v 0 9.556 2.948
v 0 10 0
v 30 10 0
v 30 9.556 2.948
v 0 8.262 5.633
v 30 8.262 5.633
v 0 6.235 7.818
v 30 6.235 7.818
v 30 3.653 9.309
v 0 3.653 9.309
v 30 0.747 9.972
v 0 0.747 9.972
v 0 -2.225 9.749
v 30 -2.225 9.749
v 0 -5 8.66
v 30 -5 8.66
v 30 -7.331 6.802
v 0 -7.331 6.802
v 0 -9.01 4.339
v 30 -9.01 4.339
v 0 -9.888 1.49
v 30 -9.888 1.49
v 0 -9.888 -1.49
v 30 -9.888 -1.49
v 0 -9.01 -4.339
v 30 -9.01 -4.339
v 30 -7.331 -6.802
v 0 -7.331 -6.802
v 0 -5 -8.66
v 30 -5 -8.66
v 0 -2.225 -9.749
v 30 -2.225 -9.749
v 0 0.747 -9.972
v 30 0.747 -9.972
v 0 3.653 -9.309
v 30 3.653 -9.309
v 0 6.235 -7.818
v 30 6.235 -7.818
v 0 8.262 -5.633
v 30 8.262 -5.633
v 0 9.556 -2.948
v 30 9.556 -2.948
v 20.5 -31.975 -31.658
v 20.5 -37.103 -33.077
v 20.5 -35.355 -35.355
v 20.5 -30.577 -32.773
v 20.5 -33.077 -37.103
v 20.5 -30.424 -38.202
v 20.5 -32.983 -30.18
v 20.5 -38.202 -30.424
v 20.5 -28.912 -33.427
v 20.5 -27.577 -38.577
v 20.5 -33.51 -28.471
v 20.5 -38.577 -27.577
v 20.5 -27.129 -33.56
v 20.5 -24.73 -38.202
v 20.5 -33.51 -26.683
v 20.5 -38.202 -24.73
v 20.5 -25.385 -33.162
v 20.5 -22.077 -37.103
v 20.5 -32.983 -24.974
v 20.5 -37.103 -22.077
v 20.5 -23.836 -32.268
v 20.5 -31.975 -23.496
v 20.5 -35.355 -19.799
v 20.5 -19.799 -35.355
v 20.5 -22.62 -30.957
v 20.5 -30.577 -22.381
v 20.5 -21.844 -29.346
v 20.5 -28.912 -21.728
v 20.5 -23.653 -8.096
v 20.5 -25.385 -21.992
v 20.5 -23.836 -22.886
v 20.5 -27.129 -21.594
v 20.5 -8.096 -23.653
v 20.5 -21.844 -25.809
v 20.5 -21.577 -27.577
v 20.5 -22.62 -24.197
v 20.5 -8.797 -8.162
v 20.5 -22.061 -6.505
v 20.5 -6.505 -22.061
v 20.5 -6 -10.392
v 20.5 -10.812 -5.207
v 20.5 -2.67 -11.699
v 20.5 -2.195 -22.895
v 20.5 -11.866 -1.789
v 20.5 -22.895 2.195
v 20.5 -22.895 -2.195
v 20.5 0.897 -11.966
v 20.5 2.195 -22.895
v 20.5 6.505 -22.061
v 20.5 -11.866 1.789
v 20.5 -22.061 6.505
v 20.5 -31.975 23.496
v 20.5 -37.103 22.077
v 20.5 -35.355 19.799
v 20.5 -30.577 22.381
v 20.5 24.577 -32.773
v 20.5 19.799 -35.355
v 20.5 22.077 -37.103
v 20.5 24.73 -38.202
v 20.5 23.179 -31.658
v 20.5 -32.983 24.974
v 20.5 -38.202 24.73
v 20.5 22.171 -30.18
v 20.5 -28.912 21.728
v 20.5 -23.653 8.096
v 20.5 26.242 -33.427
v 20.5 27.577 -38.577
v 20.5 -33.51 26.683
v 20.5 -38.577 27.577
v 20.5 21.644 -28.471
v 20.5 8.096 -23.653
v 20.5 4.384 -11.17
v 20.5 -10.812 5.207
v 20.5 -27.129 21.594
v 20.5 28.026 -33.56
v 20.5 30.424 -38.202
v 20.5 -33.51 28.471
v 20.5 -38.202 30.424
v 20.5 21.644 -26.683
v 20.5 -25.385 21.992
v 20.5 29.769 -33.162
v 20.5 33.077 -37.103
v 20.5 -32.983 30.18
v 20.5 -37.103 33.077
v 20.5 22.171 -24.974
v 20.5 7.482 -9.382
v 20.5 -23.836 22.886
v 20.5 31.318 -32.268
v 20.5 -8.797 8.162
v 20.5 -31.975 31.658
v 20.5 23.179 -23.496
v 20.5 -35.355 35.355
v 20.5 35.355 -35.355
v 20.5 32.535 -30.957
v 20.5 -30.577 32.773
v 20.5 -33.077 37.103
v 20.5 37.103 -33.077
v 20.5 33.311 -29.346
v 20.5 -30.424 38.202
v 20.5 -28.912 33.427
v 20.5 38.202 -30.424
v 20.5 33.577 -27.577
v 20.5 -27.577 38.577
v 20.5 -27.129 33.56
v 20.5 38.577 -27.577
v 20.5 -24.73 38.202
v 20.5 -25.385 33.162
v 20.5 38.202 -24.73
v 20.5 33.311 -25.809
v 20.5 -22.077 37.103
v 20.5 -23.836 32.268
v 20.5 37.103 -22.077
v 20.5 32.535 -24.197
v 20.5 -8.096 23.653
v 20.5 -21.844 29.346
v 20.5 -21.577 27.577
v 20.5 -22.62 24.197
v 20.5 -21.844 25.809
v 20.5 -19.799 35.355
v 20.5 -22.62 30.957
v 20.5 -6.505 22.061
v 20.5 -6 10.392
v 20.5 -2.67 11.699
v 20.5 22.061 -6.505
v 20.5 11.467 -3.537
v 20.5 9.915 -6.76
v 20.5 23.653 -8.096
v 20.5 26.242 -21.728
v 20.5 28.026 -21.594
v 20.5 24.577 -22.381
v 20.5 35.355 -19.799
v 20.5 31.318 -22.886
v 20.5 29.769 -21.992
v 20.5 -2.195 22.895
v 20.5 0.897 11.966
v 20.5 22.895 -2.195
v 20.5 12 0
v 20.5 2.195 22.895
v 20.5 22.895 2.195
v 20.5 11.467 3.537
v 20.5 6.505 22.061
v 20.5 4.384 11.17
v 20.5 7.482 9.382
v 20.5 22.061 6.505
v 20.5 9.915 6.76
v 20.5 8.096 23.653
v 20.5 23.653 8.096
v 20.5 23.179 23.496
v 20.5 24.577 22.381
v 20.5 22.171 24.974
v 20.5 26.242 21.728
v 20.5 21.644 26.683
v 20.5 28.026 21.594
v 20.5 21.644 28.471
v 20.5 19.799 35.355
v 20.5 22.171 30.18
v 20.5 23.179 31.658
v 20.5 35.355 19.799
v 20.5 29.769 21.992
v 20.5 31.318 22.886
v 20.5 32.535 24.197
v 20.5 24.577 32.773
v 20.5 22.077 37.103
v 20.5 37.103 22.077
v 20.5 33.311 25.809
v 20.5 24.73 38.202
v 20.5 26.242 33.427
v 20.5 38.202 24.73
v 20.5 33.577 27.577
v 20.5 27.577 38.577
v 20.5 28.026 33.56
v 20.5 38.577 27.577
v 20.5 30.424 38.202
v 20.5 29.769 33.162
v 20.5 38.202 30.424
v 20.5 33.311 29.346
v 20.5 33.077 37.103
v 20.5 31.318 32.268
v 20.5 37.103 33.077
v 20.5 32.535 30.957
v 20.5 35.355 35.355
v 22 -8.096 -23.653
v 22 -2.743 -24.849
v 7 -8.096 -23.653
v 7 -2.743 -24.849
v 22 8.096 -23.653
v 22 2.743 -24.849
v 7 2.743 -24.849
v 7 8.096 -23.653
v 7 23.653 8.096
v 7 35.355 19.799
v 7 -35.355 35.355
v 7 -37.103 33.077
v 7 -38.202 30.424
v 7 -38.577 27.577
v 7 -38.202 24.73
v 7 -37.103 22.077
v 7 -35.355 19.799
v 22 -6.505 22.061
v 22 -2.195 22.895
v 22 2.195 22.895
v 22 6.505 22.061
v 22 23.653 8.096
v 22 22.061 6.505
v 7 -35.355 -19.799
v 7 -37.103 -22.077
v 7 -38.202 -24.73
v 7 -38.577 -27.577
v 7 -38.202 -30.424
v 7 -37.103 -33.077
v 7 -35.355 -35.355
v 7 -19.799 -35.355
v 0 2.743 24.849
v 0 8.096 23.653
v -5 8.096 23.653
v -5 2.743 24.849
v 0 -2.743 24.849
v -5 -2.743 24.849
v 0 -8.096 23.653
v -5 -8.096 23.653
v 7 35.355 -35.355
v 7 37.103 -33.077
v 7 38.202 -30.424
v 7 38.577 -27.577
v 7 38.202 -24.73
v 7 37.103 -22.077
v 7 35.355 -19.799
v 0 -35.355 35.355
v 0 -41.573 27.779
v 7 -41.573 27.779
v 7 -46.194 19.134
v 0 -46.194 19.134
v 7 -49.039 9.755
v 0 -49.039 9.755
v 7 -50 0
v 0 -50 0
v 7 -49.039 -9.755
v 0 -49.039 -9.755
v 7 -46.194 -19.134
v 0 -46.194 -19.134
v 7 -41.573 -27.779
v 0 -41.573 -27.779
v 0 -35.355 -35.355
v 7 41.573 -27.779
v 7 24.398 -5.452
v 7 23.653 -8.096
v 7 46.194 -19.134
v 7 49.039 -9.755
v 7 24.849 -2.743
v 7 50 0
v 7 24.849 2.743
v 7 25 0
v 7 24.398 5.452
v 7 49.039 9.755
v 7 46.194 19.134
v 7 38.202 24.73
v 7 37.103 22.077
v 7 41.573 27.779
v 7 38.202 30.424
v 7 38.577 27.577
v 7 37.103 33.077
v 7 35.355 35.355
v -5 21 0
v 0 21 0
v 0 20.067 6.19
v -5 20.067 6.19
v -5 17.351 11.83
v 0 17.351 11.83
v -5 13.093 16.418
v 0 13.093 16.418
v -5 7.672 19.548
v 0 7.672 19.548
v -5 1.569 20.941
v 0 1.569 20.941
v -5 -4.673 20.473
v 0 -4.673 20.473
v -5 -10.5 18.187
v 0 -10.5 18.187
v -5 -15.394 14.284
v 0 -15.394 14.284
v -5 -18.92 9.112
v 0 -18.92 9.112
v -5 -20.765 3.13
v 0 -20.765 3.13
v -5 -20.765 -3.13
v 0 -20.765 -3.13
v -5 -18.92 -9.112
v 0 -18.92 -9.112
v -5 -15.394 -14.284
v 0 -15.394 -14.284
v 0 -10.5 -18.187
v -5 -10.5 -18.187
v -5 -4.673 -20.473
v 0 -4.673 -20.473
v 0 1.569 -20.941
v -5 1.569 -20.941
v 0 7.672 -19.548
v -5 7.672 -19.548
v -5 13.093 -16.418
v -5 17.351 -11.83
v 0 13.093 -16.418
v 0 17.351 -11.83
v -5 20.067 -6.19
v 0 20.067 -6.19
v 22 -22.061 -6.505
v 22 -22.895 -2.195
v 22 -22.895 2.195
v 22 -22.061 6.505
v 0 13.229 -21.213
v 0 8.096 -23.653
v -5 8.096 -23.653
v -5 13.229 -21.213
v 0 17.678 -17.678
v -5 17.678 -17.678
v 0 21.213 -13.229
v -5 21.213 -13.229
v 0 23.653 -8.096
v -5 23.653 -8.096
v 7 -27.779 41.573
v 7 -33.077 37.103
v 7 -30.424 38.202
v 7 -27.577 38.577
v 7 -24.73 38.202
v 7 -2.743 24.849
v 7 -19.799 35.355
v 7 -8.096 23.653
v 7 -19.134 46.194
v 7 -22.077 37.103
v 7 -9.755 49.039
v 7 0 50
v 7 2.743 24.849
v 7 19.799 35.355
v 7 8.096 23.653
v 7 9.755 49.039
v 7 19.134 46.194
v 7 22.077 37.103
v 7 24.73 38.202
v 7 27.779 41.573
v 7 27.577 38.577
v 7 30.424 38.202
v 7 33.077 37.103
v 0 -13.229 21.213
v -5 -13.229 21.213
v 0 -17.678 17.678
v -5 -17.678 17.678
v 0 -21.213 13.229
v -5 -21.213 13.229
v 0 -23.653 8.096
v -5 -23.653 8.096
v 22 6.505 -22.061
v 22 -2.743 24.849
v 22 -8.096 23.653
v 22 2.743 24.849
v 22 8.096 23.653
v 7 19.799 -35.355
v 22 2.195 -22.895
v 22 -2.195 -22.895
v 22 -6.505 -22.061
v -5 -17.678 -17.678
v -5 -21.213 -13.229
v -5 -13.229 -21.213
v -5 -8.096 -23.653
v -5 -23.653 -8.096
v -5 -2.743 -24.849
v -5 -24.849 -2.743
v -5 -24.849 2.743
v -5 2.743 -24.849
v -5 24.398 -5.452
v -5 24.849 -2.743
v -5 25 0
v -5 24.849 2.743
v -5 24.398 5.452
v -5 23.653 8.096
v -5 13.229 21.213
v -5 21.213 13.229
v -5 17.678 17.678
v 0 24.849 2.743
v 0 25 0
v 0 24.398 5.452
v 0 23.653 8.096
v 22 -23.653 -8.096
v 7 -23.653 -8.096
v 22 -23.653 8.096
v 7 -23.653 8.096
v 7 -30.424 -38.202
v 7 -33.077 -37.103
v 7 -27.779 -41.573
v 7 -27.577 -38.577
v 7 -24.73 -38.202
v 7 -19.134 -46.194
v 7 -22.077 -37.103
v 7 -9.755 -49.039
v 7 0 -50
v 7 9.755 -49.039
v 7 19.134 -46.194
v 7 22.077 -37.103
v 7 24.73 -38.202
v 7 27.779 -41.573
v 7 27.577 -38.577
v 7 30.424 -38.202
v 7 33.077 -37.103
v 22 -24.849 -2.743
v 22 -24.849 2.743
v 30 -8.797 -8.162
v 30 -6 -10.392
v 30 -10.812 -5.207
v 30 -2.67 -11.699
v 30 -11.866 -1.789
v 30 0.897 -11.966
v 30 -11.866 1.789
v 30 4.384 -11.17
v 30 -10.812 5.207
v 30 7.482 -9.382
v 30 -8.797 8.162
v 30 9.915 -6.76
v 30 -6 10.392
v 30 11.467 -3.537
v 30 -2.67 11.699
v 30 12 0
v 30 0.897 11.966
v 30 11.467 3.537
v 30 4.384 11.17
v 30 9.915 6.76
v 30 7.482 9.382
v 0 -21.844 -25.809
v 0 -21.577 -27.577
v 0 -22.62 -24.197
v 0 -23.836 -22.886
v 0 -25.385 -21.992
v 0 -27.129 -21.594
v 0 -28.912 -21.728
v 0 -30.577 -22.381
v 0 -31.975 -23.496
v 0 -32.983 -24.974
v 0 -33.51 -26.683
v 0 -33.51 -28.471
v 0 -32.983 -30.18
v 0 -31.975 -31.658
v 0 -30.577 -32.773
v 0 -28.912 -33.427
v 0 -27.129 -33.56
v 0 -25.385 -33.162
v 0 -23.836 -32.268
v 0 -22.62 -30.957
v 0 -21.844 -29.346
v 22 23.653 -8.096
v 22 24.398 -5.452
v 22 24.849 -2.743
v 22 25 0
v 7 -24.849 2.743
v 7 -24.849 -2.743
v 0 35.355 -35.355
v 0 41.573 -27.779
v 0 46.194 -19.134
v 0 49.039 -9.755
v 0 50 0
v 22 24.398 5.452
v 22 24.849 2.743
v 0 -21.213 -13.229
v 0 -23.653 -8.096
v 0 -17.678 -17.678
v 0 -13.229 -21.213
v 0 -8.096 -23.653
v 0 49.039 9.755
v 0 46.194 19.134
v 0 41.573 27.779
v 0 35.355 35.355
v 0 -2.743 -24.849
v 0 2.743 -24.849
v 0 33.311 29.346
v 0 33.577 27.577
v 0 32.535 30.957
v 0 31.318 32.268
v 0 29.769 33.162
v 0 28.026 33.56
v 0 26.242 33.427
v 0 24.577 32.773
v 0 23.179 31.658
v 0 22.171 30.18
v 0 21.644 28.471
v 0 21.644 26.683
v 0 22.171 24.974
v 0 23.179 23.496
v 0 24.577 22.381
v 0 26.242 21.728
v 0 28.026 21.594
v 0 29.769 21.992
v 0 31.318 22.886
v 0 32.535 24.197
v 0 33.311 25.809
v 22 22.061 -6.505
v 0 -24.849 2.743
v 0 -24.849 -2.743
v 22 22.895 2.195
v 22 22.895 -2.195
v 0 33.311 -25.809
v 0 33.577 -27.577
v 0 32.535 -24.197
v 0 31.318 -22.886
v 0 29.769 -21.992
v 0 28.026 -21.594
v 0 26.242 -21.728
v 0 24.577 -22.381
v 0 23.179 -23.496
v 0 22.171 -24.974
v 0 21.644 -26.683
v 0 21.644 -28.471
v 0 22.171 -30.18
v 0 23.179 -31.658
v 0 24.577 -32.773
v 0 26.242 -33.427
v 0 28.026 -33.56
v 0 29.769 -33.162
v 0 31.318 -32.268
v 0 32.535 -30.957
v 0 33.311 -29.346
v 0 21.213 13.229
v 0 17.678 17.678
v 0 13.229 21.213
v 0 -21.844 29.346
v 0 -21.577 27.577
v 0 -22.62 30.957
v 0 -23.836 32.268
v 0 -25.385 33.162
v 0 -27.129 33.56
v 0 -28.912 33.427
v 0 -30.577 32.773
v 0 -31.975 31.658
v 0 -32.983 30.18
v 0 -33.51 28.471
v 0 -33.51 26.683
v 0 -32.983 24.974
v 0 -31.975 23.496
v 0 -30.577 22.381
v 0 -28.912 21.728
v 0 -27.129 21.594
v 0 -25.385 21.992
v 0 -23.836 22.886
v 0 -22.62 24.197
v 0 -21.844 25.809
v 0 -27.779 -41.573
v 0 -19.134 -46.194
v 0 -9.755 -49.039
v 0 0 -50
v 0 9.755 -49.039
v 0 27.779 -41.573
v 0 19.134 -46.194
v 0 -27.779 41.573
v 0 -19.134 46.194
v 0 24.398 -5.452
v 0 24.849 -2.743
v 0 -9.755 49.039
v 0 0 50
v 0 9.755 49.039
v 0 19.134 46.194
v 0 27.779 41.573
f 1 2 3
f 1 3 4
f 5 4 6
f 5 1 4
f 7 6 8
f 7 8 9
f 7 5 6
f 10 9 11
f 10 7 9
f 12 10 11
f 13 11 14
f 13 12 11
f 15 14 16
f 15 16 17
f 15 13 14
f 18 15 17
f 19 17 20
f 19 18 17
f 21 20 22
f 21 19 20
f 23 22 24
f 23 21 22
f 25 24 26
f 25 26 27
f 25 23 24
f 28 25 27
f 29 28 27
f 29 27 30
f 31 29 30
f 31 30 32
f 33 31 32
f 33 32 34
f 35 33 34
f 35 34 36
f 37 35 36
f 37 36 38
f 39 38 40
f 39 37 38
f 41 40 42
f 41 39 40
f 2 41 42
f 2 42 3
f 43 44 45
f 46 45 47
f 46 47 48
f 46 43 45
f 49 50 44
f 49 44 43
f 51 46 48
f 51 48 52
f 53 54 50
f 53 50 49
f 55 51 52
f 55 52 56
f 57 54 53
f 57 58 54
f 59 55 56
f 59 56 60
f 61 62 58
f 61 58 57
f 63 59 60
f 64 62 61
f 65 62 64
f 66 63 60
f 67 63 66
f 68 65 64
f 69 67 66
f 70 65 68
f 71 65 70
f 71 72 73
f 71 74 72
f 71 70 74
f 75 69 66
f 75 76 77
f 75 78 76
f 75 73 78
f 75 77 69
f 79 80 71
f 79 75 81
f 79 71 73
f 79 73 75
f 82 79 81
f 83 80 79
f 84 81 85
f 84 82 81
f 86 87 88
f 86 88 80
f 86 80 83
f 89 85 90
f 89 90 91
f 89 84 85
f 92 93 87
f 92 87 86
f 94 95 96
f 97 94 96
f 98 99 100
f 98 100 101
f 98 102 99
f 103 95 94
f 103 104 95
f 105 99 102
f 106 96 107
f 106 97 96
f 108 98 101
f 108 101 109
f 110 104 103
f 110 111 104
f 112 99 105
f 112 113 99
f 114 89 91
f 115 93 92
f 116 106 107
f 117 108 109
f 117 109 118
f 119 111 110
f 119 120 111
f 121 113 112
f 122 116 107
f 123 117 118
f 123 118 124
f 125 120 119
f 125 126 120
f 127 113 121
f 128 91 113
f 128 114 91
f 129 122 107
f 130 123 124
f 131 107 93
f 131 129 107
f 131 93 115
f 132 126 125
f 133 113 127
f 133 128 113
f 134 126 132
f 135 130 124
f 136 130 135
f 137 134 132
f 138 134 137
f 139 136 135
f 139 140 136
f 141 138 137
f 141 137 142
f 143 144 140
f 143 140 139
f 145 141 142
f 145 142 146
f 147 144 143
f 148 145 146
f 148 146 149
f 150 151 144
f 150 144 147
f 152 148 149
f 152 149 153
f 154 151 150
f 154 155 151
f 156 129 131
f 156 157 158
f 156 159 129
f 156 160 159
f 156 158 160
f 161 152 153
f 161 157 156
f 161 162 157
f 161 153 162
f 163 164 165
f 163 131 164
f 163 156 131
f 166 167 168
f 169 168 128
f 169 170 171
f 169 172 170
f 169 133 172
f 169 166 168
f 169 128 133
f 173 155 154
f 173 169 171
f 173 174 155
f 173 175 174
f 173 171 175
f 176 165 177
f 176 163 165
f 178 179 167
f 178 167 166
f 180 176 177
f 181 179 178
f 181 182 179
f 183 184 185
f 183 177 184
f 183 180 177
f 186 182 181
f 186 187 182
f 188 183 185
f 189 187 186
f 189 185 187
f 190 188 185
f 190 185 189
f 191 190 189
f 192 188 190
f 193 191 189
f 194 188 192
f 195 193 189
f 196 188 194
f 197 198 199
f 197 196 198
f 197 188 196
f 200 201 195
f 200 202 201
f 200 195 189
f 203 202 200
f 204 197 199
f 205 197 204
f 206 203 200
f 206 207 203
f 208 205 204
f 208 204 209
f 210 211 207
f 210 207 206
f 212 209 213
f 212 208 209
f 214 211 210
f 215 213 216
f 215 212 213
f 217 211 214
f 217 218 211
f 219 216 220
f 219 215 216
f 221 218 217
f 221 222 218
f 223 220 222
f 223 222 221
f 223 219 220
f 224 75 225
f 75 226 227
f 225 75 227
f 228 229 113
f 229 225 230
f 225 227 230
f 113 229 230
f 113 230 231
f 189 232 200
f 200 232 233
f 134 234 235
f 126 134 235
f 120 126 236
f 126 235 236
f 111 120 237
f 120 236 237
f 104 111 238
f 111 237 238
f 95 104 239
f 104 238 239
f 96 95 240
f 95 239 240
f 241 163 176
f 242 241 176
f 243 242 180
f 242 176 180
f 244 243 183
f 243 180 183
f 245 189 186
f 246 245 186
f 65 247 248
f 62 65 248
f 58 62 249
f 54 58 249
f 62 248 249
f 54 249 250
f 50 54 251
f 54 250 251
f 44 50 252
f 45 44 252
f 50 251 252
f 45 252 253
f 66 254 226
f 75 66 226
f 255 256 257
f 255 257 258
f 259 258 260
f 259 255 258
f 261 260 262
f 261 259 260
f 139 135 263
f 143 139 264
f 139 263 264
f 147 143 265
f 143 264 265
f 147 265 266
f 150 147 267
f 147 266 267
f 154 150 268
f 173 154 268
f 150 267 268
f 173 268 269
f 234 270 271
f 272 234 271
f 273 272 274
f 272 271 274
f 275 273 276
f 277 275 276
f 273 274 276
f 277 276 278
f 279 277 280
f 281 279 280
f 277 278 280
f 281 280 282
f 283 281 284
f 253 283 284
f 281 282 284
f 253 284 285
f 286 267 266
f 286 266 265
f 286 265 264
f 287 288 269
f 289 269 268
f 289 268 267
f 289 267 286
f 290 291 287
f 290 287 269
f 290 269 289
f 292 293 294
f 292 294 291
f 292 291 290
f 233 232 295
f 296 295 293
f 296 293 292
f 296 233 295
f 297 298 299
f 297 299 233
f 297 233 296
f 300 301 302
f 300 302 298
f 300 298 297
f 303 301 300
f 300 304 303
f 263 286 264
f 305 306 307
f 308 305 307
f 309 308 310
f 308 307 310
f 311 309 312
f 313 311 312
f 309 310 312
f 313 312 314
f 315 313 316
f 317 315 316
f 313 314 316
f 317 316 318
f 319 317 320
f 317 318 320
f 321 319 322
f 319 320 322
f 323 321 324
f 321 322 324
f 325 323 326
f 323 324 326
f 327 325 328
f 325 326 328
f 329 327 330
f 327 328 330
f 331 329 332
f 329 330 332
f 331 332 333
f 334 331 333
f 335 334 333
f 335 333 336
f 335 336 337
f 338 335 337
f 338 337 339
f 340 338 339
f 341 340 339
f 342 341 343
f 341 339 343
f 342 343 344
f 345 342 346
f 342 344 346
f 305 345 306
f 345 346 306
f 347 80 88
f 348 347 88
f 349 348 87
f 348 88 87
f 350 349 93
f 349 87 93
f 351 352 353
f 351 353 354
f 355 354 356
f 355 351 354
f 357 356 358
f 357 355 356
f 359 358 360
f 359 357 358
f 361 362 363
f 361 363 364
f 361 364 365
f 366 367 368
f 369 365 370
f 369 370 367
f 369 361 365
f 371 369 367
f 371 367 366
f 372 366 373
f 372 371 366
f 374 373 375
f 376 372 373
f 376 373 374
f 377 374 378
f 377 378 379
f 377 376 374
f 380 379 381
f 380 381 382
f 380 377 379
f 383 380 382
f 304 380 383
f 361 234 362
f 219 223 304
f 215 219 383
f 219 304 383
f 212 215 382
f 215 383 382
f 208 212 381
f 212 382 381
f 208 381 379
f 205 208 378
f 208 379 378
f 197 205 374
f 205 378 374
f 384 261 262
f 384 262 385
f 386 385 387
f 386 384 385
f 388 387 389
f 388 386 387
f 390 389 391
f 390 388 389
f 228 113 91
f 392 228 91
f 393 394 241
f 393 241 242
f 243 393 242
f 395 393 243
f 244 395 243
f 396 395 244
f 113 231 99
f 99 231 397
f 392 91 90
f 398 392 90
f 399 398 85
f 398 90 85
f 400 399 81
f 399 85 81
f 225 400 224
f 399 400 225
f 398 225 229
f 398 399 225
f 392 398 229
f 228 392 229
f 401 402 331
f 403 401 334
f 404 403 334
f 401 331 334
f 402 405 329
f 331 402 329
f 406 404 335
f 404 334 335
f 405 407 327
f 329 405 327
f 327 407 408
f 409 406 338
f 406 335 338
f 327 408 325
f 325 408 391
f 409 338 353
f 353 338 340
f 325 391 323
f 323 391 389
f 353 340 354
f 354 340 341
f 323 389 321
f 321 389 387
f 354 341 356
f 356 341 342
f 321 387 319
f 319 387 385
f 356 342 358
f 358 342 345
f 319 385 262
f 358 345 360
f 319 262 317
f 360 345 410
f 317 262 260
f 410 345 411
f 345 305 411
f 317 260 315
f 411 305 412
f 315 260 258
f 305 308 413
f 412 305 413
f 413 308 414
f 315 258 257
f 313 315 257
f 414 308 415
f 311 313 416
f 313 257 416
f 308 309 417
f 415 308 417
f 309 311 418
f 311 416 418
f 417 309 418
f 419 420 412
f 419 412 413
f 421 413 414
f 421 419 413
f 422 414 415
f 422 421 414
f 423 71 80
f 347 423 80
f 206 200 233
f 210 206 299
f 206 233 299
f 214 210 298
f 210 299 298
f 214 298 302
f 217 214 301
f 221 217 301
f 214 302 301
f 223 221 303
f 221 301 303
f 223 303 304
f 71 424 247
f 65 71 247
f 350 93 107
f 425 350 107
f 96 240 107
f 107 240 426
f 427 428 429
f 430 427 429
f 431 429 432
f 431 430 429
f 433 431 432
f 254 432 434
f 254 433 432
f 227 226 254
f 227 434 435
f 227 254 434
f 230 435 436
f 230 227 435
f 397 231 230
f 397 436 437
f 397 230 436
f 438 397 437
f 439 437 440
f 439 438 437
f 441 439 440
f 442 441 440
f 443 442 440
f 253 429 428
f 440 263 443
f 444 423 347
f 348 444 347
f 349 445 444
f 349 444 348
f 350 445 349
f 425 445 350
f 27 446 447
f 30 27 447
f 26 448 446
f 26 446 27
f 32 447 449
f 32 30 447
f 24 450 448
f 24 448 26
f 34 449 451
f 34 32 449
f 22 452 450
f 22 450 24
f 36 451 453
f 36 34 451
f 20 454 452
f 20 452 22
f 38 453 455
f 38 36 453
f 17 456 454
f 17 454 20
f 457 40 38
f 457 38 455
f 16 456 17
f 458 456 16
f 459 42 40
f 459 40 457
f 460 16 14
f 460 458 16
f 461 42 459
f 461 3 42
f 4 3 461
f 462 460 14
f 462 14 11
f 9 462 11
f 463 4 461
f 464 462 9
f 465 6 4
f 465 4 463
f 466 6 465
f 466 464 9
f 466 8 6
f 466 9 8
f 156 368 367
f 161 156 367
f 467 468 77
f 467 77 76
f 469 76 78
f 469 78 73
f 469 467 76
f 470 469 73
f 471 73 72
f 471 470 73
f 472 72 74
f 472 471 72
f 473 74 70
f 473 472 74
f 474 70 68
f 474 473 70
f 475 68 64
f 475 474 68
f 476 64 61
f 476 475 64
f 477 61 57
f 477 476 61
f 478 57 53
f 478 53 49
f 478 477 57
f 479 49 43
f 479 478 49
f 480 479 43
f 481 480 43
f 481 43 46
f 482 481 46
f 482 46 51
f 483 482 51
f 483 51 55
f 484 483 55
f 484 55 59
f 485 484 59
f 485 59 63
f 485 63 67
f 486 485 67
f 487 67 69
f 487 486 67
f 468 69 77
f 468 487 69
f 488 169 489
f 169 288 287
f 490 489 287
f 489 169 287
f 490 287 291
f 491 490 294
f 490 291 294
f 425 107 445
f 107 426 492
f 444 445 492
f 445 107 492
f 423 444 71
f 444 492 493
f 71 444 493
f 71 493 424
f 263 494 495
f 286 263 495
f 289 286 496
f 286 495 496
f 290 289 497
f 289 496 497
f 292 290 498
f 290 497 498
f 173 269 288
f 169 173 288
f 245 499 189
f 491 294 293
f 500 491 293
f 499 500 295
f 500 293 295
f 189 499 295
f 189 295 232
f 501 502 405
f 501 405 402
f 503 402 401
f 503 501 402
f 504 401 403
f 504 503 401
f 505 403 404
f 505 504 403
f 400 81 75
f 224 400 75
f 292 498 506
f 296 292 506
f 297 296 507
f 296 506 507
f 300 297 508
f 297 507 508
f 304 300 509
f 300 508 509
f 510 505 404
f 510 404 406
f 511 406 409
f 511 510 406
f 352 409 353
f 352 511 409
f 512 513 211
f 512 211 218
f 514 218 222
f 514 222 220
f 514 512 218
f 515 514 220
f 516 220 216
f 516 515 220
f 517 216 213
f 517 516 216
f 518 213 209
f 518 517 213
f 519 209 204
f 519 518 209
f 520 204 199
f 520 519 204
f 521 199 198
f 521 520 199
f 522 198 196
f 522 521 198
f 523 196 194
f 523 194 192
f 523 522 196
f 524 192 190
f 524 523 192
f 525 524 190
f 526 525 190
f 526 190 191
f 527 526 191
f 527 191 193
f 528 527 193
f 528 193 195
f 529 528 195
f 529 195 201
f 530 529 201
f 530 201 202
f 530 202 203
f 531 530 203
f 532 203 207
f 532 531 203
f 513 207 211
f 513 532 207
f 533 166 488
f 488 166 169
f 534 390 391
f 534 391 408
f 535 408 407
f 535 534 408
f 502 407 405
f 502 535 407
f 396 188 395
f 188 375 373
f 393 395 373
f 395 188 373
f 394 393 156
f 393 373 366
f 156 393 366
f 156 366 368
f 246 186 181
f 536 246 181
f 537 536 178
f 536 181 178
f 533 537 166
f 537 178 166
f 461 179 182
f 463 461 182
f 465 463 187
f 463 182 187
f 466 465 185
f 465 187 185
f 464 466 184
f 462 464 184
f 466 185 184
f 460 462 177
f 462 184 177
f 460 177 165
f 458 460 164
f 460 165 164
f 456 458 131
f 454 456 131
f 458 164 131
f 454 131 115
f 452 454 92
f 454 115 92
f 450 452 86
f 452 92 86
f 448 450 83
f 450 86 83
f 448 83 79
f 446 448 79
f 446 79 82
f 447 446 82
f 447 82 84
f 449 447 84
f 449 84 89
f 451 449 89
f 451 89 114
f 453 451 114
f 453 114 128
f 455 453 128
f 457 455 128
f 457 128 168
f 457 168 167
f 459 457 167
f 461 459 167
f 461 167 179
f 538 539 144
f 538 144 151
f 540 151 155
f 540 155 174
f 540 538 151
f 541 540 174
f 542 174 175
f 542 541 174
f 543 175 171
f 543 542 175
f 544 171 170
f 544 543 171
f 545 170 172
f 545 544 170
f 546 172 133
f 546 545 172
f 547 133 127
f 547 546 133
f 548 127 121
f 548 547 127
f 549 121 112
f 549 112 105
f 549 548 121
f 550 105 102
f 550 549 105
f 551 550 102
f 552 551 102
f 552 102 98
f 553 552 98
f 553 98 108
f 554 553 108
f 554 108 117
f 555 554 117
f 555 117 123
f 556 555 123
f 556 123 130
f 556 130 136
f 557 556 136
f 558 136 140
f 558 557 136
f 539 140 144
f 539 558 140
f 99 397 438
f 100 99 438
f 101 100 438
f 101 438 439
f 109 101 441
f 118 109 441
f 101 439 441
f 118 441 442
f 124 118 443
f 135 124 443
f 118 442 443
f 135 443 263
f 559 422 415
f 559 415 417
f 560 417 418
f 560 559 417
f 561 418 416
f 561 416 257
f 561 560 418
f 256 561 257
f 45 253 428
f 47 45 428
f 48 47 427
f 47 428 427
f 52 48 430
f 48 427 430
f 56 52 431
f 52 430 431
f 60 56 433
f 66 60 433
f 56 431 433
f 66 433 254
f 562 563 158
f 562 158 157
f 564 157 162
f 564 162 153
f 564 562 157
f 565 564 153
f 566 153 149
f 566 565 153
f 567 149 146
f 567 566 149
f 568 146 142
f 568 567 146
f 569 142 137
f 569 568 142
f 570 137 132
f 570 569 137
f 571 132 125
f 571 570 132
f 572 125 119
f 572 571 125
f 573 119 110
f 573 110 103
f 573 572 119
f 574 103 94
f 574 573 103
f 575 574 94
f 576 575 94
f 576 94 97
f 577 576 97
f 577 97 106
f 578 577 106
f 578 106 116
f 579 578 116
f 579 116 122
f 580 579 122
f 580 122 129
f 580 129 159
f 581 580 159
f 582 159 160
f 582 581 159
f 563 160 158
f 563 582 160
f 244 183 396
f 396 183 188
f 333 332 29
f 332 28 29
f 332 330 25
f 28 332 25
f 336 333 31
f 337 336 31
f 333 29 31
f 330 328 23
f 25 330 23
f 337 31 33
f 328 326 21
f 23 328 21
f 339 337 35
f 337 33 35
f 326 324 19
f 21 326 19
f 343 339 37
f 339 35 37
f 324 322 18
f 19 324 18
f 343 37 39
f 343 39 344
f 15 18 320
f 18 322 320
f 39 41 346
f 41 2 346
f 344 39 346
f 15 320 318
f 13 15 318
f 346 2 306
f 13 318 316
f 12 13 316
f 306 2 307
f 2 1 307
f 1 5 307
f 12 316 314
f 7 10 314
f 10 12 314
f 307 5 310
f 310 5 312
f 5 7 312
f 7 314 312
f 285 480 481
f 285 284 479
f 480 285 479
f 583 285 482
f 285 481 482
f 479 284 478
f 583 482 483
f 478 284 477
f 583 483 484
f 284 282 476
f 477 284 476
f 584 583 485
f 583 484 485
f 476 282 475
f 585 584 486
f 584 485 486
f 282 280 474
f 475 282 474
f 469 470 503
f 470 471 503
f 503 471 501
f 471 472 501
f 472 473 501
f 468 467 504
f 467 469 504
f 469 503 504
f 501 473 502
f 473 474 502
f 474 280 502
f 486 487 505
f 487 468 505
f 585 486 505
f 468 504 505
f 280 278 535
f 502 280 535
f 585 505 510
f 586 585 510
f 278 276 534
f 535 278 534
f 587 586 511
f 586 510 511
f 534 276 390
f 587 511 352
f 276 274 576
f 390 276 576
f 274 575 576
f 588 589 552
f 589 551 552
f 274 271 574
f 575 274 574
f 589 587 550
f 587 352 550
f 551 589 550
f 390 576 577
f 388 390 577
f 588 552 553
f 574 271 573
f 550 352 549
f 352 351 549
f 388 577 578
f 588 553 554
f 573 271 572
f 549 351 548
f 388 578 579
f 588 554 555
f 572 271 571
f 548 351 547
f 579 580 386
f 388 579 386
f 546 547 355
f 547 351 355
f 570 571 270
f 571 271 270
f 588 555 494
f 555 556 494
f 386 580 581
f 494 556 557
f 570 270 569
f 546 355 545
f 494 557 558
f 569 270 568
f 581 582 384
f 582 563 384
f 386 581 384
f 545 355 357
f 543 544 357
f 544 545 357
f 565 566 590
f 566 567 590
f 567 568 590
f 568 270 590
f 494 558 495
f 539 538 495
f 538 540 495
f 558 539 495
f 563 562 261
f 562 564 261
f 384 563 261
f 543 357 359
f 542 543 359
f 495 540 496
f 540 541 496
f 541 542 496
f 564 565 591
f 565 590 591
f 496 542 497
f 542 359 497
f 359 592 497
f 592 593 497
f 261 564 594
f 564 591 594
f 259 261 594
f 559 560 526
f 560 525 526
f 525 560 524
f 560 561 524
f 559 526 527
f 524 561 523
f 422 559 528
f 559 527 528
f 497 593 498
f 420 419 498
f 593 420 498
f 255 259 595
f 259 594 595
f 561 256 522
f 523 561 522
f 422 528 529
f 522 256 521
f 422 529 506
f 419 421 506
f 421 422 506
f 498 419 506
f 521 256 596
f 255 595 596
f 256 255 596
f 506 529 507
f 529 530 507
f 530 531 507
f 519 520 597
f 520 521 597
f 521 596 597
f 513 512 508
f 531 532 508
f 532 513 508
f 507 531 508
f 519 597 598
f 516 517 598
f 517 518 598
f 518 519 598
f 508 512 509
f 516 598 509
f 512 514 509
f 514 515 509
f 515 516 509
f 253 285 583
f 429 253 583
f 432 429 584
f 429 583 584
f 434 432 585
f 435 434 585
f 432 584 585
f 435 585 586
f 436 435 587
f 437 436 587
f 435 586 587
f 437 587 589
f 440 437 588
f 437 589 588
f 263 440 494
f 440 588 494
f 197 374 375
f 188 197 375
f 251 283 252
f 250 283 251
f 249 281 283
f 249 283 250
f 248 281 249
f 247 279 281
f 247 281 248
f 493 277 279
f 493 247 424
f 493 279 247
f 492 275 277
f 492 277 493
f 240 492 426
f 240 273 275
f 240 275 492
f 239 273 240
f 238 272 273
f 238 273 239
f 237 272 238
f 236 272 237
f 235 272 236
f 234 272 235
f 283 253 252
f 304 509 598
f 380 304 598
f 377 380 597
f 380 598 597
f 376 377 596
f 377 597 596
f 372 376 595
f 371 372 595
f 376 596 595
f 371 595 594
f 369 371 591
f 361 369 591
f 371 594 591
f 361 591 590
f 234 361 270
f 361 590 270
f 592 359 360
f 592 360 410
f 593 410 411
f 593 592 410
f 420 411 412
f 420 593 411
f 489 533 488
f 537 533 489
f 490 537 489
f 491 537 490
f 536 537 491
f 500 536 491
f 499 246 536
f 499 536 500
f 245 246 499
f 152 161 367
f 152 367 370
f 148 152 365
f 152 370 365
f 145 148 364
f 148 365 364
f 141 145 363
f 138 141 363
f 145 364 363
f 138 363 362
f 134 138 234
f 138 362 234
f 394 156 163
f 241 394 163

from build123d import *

# Parameters (mm, degrees)
F0_R     = 12
F0_R_2   = 10
F1_DEPTH = 30
F0_R_3   = 21
F2_DEPTH = 20.5
F3_DEPTH = 22
F0_R_4   = 6
F4_DEPTH = 20.5
F5_DEPTH = 7
F6_DEPTH = 5


with BuildPart() as f1:
    # F0 (on Right) → F1 (new body)
    with BuildSketch(Plane.YZ):
        Circle(F0_R)
        Circle(F0_R_2, mode=Mode.SUBTRACT)
    extrude(amount=F1_DEPTH)

    # F0 (on Right) → F2 (join)
    with BuildSketch(Plane.YZ):
        with BuildLine():
            ThreePointArc((-8.0963332733, 23.6526824594), (-17.6776695297, 17.6776695297), (-23.6526824594, 8.0963332733))
            Line((-23.6526824594, 8.0963332733), (-22.0610314501, 6.504682264))
            ThreePointArc((-22.0610314501, 6.504682264), (-23, -4.4e-09), (-22.0610314476, -6.5046822725))
            Line((-22.0610314476, -6.5046822725), (-23.6526824563, -8.0963332824))
            ThreePointArc((-23.6526824563, -8.0963332824), (-17.6776695229, -17.6776695365), (-8.0963332642, -23.6526824626))
            Line((-8.0963332642, -23.6526824626), (-6.5046822555, -22.0610314526))
            ThreePointArc((-6.5046822555, -22.0610314526), (7.4e-09, -23), (6.5046822697, -22.0610314485))
            Line((6.5046822697, -22.0610314485), (8.0963332794, -23.6526824574))
            ThreePointArc((8.0963332794, -23.6526824574), (17.6776695342, -17.6776695251), (23.6526824615, -8.0963332673))
            Line((23.6526824615, -8.0963332673), (22.0610314518, -6.5046822584))
            ThreePointArc((22.0610314518, -6.5046822584), (23, 4.4e-09), (22.0610314493, 6.5046822669))
            Line((22.0610314493, 6.5046822669), (23.6526824584, 8.0963332764))
            ThreePointArc((23.6526824584, 8.0963332764), (17.6776695274, 17.6776695319), (8.0963332703, 23.6526824605))
            Line((8.0963332703, 23.6526824605), (6.5046822612, 22.061031451))
            ThreePointArc((6.5046822612, 22.061031451), (-1.5e-09, 23), (-6.504682264, 22.0610314501))
            Line((-6.504682264, 22.0610314501), (-8.0963332733, 23.6526824594))
        make_face()
        Circle(F0_R_3, mode=Mode.SUBTRACT)
        Circle(F0_R_3)
        Circle(F0_R, mode=Mode.SUBTRACT)
    extrude(amount=F2_DEPTH)

    # F0 (on Right) → F3 (join)
    with BuildSketch(Plane.YZ):
        with BuildLine():
            Line((-22.0610314501, 6.504682264), (-23.6526824594, 8.0963332733))
            ThreePointArc((-23.6526824594, 8.0963332733), (-25, -4.8e-09), (-23.6526824563, -8.0963332824))
            Line((-23.6526824563, -8.0963332824), (-22.0610314476, -6.5046822725))
            ThreePointArc((-22.0610314476, -6.5046822725), (-23, -4.4e-09), (-22.0610314501, 6.504682264))
        make_face()
        with BuildLine():
            ThreePointArc((8.0963332703, 23.6526824605), (-1.6e-09, 25), (-8.0963332733, 23.6526824594))
            Line((-8.0963332733, 23.6526824594), (-6.504682264, 22.0610314501))
            ThreePointArc((-6.504682264, 22.0610314501), (-1.5e-09, 23), (6.5046822612, 22.061031451))
            Line((6.5046822612, 22.061031451), (8.0963332703, 23.6526824605))
        make_face()
        with BuildLine():
            ThreePointArc((25, 0), (24.6608704374, 4.1038359214), (23.6526824584, 8.0963332764))
            Line((23.6526824584, 8.0963332764), (22.0610314493, 6.5046822669))
            ThreePointArc((22.0610314493, 6.5046822669), (23, 4.4e-09), (22.0610314518, -6.5046822584))
            Line((22.0610314518, -6.5046822584), (23.6526824615, -8.0963332673))
            ThreePointArc((23.6526824615, -8.0963332673), (24.6608704382, -4.1038359167), (25, 0))
        make_face()
        with BuildLine():
            Line((-6.5046822555, -22.0610314526), (-8.0963332642, -23.6526824626))
            ThreePointArc((-8.0963332642, -23.6526824626), (8e-09, -25), (8.0963332794, -23.6526824574))
            Line((8.0963332794, -23.6526824574), (6.5046822697, -22.0610314485))
            ThreePointArc((6.5046822697, -22.0610314485), (7.4e-09, -23), (-6.5046822555, -22.0610314526))
        make_face()
    extrude(amount=F3_DEPTH)

    # F0 (on Right) → F4 (join, through all)
    with BuildSketch(Plane.YZ):
        with BuildLine():
            Line((-35.3553390593, 19.7989898732), (-23.6526824594, 8.0963332733))
            ThreePointArc((-23.6526824594, 8.0963332733), (-17.6776695297, 17.6776695297), (-8.0963332733, 23.6526824594))
            Line((-8.0963332733, 23.6526824594), (-19.7989898732, 35.3553390593))
            ThreePointArc((-19.7989898732, 35.3553390593), (-27.5771644248, 38.5771644663), (-35.3553390007, 35.355339118))
            ThreePointArc((-35.3553390007, 35.355339118), (-38.5771644663, 27.5771645077), (-35.3553390593, 19.7989898732))
        make_face()
        with Locations((-27.5771644663, 27.5771644663)):
            Circle(F0_R_4, mode=Mode.SUBTRACT)
        with BuildLine():
            ThreePointArc((-8.0963332642, -23.6526824626), (-17.6776695229, -17.6776695365), (-23.6526824563, -8.0963332824))
            Line((-23.6526824563, -8.0963332824), (-35.3553390517, -19.7989898868))
            ThreePointArc((-35.3553390517, -19.7989898868), (-38.5771644557, -27.5771644811), (-35.3553390457, -35.3553390729))
            ThreePointArc((-35.3553390457, -35.3553390729), (-27.5771644514, -38.5771644769), (-19.7989898596, -35.3553390669))
            Line((-19.7989898596, -35.3553390669), (-8.0963332642, -23.6526824626))
        make_face()
        with Locations((-27.5771644557, -27.5771644769)):
            Circle(F0_R_4, mode=Mode.SUBTRACT)
        with BuildLine():
            ThreePointArc((23.6526824615, -8.0963332673), (17.6776695342, -17.6776695251), (8.0963332794, -23.6526824574))
            Line((8.0963332794, -23.6526824574), (19.7989898823, -35.3553390542))
            ThreePointArc((19.7989898823, -35.3553390542), (27.5771645176, -38.5771644592), (35.355339127, -35.3553389916))
            ThreePointArc((35.355339127, -35.3553389916), (38.5771644733, -27.5771644149), (35.3553390644, -19.7989898642))
            Line((35.3553390644, -19.7989898642), (23.6526824615, -8.0963332673))
        make_face()
        with Locations((27.5771644733, -27.5771644592)):
            Circle(F0_R_4, mode=Mode.SUBTRACT)
        with BuildLine():
            Line((19.7989898687, 35.3553390619), (8.0963332703, 23.6526824605))
            ThreePointArc((8.0963332703, 23.6526824605), (17.6776695274, 17.6776695319), (23.6526824584, 8.0963332764))
            Line((23.6526824584, 8.0963332764), (35.3553390568, 19.7989898778))
            ThreePointArc((35.3553390568, 19.7989898778), (38.5771644627, 27.5771644712), (35.3553390548, 35.3553390639))
            ThreePointArc((35.3553390548, 35.3553390639), (27.5771644613, 38.5771644698), (19.7989898687, 35.3553390619))
        make_face()
        with Locations((27.5771644627, 27.5771644698)):
            Circle(F0_R_4, mode=Mode.SUBTRACT)
    extrude(amount=F4_DEPTH)

    # F0 (on Right) → F5 (join)
    with BuildSketch(Plane.YZ):
        with BuildLine():
            ThreePointArc((-23.6526824563, -8.0963332824), (-25, -4.8e-09), (-23.6526824594, 8.0963332733))
            Line((-23.6526824594, 8.0963332733), (-35.3553390593, 19.7989898732))
            ThreePointArc((-35.3553390593, 19.7989898732), (-38.5771644663, 27.5771645077), (-35.3553390007, 35.355339118))
            ThreePointArc((-35.3553390007, 35.355339118), (-50, 3.19e-08), (-35.3553390457, -35.3553390729))
            ThreePointArc((-35.3553390457, -35.3553390729), (-38.5771644557, -27.5771644811), (-35.3553390517, -19.7989898868))
            Line((-35.3553390517, -19.7989898868), (-23.6526824563, -8.0963332824))
        make_face()
        with BuildLine():
            Line((-19.7989898732, 35.3553390593), (-8.0963332733, 23.6526824594))
            ThreePointArc((-8.0963332733, 23.6526824594), (-1.6e-09, 25), (8.0963332703, 23.6526824605))
            Line((8.0963332703, 23.6526824605), (19.7989898687, 35.3553390619))
            ThreePointArc((19.7989898687, 35.3553390619), (27.5771644613, 38.5771644698), (35.3553390548, 35.3553390639))
            ThreePointArc((35.3553390548, 35.3553390639), (3.83e-08, 50), (-35.3553390007, 35.355339118))
            ThreePointArc((-35.3553390007, 35.355339118), (-27.5771644248, 38.5771644663), (-19.7989898732, 35.3553390593))
        make_face()
        with BuildLine():
            ThreePointArc((8.0963332794, -23.6526824574), (8e-09, -25), (-8.0963332642, -23.6526824626))
            Line((-8.0963332642, -23.6526824626), (-19.7989898596, -35.3553390669))
            ThreePointArc((-19.7989898596, -35.3553390669), (-27.5771644514, -38.5771644769), (-35.3553390457, -35.3553390729))
            ThreePointArc((-35.3553390457, -35.3553390729), (5.75e-08, -50), (35.355339127, -35.3553389916))
            ThreePointArc((35.355339127, -35.3553389916), (27.5771645176, -38.5771644592), (19.7989898823, -35.3553390542))
            Line((19.7989898823, -35.3553390542), (8.0963332794, -23.6526824574))
        make_face()
        with BuildLine():
            ThreePointArc((50, 0), (46.1939766243, 19.1341716212), (35.3553390548, 35.3553390639))
            ThreePointArc((35.3553390548, 35.3553390639), (38.5771644627, 27.5771644712), (35.3553390568, 19.7989898778))
            Line((35.3553390568, 19.7989898778), (23.6526824584, 8.0963332764))
            ThreePointArc((23.6526824584, 8.0963332764), (24.6608704374, 4.1038359214), (25, 0))
            ThreePointArc((25, 0), (24.6608704382, -4.1038359167), (23.6526824615, -8.0963332673))
            Line((23.6526824615, -8.0963332673), (35.3553390644, -19.7989898642))
            ThreePointArc((35.3553390644, -19.7989898642), (38.5771644733, -27.5771644149), (35.355339127, -35.3553389916))
            ThreePointArc((35.355339127, -35.3553389916), (46.1939766439, -19.134171574), (50, 0))
        make_face()
    extrude(amount=F5_DEPTH)

    # F0 (on Right) → F6 (join)
    with BuildSketch(Plane.YZ):
        with BuildLine():
            ThreePointArc((-8.0963332733, 23.6526824594), (-17.6776695297, 17.6776695297), (-23.6526824594, 8.0963332733))
            Line((-23.6526824594, 8.0963332733), (-22.0610314501, 6.504682264))
            ThreePointArc((-22.0610314501, 6.504682264), (-23, -4.4e-09), (-22.0610314476, -6.5046822725))
            Line((-22.0610314476, -6.5046822725), (-23.6526824563, -8.0963332824))
            ThreePointArc((-23.6526824563, -8.0963332824), (-17.6776695229, -17.6776695365), (-8.0963332642, -23.6526824626))
            Line((-8.0963332642, -23.6526824626), (-6.5046822555, -22.0610314526))
            ThreePointArc((-6.5046822555, -22.0610314526), (7.4e-09, -23), (6.5046822697, -22.0610314485))
            Line((6.5046822697, -22.0610314485), (8.0963332794, -23.6526824574))
            ThreePointArc((8.0963332794, -23.6526824574), (17.6776695342, -17.6776695251), (23.6526824615, -8.0963332673))
            Line((23.6526824615, -8.0963332673), (22.0610314518, -6.5046822584))
            ThreePointArc((22.0610314518, -6.5046822584), (23, 4.4e-09), (22.0610314493, 6.5046822669))
            Line((22.0610314493, 6.5046822669), (23.6526824584, 8.0963332764))
            ThreePointArc((23.6526824584, 8.0963332764), (17.6776695274, 17.6776695319), (8.0963332703, 23.6526824605))
            Line((8.0963332703, 23.6526824605), (6.5046822612, 22.061031451))
            ThreePointArc((6.5046822612, 22.061031451), (-1.5e-09, 23), (-6.504682264, 22.0610314501))
            Line((-6.504682264, 22.0610314501), (-8.0963332733, 23.6526824594))
        make_face()
        Circle(F0_R_3, mode=Mode.SUBTRACT)
        with BuildLine():
            Line((-22.0610314501, 6.504682264), (-23.6526824594, 8.0963332733))
            ThreePointArc((-23.6526824594, 8.0963332733), (-25, -4.8e-09), (-23.6526824563, -8.0963332824))
            Line((-23.6526824563, -8.0963332824), (-22.0610314476, -6.5046822725))
            ThreePointArc((-22.0610314476, -6.5046822725), (-23, -4.4e-09), (-22.0610314501, 6.504682264))
        make_face()
        with BuildLine():
            ThreePointArc((8.0963332703, 23.6526824605), (-1.6e-09, 25), (-8.0963332733, 23.6526824594))
            Line((-8.0963332733, 23.6526824594), (-6.504682264, 22.0610314501))
            ThreePointArc((-6.504682264, 22.0610314501), (-1.5e-09, 23), (6.5046822612, 22.061031451))
            Line((6.5046822612, 22.061031451), (8.0963332703, 23.6526824605))
        make_face()
        with BuildLine():
            ThreePointArc((25, 0), (24.6608704374, 4.1038359214), (23.6526824584, 8.0963332764))
            Line((23.6526824584, 8.0963332764), (22.0610314493, 6.5046822669))
            ThreePointArc((22.0610314493, 6.5046822669), (23, 4.4e-09), (22.0610314518, -6.5046822584))
            Line((22.0610314518, -6.5046822584), (23.6526824615, -8.0963332673))
            ThreePointArc((23.6526824615, -8.0963332673), (24.6608704382, -4.1038359167), (25, 0))
        make_face()
        with BuildLine():
            Line((-6.5046822555, -22.0610314526), (-8.0963332642, -23.6526824626))
            ThreePointArc((-8.0963332642, -23.6526824626), (8e-09, -25), (8.0963332794, -23.6526824574))
            Line((8.0963332794, -23.6526824574), (6.5046822697, -22.0610314485))
            ThreePointArc((6.5046822697, -22.0610314485), (7.4e-09, -23), (-6.5046822555, -22.0610314526))
        make_face()
    extrude(amount=-F6_DEPTH)


solid = f1.part
